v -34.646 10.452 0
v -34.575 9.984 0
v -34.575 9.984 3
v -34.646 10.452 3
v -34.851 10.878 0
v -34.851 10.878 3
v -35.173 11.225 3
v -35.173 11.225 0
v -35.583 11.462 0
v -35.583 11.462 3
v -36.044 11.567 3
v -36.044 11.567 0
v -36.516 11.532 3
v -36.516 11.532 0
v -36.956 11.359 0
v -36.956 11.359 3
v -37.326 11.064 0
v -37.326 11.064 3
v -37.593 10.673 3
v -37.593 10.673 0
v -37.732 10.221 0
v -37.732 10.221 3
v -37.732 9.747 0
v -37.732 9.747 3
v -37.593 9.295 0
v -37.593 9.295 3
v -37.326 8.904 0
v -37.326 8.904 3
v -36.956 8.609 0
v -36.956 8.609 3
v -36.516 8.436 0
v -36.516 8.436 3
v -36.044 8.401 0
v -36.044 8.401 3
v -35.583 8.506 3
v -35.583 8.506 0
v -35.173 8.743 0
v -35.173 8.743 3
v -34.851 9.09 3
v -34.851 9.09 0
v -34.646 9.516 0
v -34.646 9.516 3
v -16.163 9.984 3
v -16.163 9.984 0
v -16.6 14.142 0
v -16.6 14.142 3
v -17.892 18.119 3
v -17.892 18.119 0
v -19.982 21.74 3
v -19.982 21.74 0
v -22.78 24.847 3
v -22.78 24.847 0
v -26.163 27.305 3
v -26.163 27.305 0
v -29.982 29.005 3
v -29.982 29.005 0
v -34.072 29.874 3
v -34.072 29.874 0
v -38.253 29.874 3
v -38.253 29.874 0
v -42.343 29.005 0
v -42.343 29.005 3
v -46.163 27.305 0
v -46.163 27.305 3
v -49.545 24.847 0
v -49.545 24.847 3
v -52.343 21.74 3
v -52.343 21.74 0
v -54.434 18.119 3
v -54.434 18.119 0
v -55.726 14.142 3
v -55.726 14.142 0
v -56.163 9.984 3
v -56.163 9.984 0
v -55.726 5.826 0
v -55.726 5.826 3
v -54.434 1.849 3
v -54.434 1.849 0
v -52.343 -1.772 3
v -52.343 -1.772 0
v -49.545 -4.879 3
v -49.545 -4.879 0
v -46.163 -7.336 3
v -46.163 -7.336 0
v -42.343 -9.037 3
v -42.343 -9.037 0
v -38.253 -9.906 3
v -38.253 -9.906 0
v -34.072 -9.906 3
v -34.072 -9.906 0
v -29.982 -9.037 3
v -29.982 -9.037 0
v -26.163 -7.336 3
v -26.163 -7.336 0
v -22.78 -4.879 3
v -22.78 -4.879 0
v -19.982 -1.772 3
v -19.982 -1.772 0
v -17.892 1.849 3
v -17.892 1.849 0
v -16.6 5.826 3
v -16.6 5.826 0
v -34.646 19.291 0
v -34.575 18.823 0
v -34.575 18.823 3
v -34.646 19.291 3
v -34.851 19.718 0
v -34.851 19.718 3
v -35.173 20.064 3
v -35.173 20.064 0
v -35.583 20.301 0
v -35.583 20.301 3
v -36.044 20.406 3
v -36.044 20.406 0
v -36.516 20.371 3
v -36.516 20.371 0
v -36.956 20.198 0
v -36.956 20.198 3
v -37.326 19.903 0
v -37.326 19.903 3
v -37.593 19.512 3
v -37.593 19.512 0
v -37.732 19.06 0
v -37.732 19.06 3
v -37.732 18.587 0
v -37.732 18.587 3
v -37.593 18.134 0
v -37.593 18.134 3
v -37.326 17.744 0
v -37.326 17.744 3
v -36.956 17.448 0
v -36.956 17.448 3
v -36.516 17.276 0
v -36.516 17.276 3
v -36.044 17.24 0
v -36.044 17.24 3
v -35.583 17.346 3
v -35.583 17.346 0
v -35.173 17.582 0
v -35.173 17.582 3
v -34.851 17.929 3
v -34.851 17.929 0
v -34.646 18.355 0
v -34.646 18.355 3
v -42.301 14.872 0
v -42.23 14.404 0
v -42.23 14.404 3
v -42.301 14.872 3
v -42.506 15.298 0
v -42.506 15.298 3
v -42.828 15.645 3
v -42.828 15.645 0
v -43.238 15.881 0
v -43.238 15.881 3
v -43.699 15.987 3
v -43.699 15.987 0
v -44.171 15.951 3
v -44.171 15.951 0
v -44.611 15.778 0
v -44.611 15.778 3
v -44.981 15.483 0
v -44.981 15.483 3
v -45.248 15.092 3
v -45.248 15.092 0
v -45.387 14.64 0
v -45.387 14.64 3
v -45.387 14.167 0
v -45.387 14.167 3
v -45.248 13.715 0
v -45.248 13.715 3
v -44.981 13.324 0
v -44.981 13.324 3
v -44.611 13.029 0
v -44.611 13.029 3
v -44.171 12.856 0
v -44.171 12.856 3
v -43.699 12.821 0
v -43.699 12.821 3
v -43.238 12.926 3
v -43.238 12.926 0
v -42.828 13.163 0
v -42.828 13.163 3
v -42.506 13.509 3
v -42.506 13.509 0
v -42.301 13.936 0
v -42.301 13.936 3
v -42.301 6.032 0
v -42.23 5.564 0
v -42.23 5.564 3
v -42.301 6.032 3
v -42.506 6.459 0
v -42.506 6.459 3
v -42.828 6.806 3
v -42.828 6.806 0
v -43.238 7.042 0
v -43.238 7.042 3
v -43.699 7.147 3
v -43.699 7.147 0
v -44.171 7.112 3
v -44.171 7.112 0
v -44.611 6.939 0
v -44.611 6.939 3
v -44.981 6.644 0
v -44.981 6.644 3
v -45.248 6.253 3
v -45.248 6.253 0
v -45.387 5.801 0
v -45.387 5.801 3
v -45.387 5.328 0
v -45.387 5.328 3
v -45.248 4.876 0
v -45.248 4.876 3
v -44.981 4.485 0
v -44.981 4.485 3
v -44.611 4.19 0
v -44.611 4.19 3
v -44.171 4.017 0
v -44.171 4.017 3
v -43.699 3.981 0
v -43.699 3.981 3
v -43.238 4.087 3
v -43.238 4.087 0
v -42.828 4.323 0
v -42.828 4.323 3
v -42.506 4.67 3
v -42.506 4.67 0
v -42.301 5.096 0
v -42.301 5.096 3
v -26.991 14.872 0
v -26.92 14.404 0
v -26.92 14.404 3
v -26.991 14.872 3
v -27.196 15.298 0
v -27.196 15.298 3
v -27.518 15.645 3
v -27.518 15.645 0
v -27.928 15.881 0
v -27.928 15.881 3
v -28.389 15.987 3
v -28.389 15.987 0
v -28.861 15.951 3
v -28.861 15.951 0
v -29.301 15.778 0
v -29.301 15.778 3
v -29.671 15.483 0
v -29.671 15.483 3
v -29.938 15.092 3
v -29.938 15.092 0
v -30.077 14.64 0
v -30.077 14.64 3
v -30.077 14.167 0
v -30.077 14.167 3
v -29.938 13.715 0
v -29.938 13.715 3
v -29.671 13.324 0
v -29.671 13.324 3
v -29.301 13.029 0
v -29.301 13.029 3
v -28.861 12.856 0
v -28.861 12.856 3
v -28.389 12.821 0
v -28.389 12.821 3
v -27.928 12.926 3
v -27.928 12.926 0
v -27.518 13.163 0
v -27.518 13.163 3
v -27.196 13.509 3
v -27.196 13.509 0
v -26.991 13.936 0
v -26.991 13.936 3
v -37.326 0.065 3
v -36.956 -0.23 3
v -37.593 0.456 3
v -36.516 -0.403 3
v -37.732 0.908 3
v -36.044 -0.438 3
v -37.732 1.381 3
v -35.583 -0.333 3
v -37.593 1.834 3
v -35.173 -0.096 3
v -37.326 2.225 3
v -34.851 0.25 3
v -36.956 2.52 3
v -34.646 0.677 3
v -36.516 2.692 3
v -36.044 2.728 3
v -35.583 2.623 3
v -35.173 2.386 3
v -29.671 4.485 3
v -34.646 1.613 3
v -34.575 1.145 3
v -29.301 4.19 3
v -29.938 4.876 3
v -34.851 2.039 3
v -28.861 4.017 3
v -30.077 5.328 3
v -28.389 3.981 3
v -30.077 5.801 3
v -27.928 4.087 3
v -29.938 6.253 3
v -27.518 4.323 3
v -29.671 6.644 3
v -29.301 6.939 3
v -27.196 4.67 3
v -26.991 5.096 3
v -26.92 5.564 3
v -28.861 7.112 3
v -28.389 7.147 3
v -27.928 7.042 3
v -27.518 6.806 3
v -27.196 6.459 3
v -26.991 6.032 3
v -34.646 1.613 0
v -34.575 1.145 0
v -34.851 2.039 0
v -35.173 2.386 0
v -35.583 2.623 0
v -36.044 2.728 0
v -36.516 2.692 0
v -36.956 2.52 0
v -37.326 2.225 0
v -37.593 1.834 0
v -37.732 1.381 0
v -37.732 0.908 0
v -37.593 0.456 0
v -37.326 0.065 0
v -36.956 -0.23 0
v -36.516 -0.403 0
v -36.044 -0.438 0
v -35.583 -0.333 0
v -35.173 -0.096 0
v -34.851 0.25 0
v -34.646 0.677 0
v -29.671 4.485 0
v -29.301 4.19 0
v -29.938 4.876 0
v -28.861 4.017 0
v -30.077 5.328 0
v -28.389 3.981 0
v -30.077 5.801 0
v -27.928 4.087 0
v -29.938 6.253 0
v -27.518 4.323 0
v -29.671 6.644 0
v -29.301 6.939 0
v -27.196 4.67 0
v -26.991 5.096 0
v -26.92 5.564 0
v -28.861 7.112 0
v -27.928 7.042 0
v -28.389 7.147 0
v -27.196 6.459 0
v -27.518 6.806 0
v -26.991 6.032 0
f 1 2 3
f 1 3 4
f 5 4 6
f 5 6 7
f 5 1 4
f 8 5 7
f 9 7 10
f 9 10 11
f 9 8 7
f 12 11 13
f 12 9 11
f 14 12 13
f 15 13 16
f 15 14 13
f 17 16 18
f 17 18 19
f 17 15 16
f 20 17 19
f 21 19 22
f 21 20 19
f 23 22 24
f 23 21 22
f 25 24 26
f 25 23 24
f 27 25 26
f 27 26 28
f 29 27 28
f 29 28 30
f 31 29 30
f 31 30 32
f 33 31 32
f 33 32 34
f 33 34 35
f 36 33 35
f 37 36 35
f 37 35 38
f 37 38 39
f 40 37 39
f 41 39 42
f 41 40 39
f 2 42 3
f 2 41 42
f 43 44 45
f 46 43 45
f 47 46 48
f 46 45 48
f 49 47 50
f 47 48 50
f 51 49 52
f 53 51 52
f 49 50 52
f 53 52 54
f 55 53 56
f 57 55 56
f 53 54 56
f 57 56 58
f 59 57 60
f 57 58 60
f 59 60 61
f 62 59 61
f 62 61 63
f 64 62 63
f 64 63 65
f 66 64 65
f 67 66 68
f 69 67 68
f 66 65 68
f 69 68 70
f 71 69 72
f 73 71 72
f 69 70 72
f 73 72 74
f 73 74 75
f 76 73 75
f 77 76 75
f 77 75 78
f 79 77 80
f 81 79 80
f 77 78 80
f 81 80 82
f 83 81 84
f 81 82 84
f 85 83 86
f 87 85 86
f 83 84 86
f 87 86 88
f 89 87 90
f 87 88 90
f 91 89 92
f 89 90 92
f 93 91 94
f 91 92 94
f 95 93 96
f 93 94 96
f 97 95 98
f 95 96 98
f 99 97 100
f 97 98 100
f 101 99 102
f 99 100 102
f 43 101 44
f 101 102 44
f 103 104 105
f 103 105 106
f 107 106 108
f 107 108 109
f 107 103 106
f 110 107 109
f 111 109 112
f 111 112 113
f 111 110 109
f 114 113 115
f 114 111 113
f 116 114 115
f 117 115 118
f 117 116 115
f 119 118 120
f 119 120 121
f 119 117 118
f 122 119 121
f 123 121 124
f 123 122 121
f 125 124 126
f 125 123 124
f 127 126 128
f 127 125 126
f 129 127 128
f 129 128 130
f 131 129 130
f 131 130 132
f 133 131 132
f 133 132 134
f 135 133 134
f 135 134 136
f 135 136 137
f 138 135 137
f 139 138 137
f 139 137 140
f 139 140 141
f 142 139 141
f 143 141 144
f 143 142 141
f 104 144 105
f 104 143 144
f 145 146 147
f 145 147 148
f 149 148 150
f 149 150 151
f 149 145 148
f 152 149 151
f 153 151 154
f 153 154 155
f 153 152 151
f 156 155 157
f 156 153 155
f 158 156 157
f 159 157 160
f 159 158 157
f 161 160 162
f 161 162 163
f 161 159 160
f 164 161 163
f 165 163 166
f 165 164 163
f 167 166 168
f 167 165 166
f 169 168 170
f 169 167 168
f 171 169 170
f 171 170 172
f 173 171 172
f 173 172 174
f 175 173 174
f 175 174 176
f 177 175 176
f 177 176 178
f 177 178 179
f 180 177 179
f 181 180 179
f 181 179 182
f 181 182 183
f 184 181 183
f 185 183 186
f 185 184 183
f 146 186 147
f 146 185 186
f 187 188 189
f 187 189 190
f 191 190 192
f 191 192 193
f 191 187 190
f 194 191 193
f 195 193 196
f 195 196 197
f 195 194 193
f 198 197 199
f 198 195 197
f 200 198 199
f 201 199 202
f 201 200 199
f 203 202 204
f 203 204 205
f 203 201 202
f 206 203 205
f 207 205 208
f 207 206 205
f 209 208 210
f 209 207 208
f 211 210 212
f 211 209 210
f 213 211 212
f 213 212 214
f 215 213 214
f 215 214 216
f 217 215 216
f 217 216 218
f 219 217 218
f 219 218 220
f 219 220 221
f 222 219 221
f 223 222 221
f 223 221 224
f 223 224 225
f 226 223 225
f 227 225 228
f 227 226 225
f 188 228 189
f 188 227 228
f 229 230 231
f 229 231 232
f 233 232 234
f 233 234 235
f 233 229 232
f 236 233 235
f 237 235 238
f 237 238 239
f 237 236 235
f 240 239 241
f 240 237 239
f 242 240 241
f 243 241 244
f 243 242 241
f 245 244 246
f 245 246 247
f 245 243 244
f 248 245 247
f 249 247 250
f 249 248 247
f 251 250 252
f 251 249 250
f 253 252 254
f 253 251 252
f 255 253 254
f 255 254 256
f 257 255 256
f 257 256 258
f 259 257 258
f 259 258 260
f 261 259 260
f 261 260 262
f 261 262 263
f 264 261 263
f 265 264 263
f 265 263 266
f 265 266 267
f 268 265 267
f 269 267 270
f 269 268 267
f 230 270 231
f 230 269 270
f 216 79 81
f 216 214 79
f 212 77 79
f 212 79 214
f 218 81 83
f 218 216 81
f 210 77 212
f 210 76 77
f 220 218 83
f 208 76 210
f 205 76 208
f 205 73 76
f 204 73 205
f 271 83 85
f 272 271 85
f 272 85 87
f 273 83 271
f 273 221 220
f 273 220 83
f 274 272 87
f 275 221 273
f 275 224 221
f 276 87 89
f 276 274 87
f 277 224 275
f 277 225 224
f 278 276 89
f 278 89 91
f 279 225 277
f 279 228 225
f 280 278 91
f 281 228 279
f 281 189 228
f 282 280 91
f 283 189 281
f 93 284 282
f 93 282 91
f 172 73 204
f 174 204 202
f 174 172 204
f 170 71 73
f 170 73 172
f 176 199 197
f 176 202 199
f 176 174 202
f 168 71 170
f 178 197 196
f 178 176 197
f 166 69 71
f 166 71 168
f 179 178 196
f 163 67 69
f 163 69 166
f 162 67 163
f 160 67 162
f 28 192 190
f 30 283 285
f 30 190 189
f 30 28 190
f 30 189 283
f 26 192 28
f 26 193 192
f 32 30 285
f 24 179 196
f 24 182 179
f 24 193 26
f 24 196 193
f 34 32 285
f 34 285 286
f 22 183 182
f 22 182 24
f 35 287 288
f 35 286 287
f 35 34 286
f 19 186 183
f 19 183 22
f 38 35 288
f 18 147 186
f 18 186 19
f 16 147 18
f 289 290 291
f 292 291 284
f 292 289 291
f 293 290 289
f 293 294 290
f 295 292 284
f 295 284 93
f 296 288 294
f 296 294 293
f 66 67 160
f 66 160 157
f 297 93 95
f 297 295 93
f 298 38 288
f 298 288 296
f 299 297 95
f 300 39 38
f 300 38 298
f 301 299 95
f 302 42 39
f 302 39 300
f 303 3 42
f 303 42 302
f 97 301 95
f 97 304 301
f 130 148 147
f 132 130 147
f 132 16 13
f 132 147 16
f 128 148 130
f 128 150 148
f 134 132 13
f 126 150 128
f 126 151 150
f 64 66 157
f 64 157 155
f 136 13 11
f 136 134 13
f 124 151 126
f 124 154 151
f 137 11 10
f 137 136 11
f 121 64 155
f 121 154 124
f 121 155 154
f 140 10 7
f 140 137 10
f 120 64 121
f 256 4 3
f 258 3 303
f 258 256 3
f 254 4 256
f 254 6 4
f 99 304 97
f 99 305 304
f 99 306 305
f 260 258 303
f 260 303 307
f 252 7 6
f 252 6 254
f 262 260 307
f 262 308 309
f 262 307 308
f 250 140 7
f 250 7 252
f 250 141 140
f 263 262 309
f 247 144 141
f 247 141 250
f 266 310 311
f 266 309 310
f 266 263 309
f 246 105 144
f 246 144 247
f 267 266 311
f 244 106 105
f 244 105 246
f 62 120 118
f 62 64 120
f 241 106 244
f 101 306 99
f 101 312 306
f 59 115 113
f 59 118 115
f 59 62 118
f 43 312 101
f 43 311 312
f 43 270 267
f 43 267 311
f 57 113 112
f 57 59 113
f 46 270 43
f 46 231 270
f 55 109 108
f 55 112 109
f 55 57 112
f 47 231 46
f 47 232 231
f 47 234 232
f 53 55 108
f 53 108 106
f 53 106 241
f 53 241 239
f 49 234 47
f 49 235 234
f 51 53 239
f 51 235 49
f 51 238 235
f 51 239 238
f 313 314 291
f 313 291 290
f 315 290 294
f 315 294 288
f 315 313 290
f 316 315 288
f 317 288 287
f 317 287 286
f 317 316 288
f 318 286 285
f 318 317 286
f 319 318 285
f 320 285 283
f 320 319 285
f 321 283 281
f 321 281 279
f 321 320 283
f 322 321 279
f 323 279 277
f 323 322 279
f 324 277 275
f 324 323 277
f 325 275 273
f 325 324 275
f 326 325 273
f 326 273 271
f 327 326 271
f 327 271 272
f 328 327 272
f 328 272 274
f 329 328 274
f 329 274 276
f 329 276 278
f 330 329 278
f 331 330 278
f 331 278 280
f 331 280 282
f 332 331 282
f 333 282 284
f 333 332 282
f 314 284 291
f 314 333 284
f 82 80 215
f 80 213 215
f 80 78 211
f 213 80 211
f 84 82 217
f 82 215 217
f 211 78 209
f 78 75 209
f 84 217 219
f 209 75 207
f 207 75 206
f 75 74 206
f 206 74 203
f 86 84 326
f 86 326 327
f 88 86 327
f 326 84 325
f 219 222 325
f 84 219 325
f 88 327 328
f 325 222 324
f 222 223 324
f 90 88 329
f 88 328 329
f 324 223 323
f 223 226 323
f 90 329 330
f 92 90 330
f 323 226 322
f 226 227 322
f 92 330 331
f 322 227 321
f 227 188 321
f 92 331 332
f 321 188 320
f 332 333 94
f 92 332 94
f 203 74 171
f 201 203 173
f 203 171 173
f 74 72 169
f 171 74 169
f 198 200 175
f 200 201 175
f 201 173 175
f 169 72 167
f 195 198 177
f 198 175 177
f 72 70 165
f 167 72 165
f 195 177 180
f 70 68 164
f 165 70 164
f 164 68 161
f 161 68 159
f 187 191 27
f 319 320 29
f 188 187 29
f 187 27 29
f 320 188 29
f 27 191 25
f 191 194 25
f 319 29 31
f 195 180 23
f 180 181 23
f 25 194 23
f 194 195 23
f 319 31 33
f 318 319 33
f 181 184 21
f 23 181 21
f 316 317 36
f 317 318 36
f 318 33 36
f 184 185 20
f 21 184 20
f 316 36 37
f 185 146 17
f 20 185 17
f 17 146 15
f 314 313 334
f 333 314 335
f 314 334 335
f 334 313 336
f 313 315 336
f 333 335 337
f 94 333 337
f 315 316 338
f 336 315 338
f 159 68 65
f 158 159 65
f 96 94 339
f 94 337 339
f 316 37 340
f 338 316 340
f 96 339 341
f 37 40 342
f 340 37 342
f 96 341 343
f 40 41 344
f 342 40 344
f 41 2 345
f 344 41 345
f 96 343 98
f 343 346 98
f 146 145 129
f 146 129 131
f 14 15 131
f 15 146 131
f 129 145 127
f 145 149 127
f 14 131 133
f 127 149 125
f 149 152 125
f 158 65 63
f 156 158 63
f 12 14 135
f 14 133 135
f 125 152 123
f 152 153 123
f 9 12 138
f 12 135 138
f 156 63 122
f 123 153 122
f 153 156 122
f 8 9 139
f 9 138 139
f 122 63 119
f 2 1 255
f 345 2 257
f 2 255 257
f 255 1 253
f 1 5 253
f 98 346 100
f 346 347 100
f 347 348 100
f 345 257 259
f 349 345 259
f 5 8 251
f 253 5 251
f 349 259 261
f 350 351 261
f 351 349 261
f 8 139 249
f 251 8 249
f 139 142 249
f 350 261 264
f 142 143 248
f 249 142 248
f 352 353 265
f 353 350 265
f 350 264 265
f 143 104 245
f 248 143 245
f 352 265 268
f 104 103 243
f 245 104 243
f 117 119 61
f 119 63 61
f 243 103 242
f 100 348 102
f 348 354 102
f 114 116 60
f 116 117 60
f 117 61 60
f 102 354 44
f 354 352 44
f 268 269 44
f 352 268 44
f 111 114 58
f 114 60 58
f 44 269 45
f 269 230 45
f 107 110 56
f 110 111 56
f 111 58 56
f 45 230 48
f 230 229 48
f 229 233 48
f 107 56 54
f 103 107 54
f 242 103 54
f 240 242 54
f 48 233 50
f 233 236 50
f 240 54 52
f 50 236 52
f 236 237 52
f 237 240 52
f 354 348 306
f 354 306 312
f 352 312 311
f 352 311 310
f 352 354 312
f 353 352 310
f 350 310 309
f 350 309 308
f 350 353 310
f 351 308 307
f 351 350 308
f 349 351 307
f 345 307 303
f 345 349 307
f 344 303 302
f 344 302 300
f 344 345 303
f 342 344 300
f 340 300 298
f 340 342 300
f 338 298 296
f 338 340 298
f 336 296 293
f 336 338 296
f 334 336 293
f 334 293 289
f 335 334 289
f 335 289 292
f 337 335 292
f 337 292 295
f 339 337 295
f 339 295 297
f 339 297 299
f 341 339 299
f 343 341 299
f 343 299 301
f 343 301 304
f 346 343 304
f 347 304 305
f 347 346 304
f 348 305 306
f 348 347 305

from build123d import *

# Parameters (mm, degrees)
F0_R     = 20
F0_R_2   = 1.5875
F1_DEPTH = 3


with BuildPart() as f1:
    # F0 (on Top) → F1 (new body)
    with BuildSketch(Plane.XY):
        with Locations((-36.162619, 9.984028)):
            Circle(F0_R)
        with Locations((-43.817643, 5.564397)):
            Circle(F0_R_2, mode=Mode.SUBTRACT)
        with Locations((-36.162619, 1.144767)):
            Circle(F0_R_2, mode=Mode.SUBTRACT)
        with Locations((-28.507594, 5.564397)):
            Circle(F0_R_2, mode=Mode.SUBTRACT)
        with Locations((-43.817643, 14.403658)):
            Circle(F0_R_2, mode=Mode.SUBTRACT)
        with Locations((-36.162619, 9.984028)):
            Circle(F0_R_2, mode=Mode.SUBTRACT)
        with Locations((-28.507594, 14.403658)):
            Circle(F0_R_2, mode=Mode.SUBTRACT)
        with Locations((-36.162619, 18.823288)):
            Circle(F0_R_2, mode=Mode.SUBTRACT)
    extrude(amount=F1_DEPTH)


solid = f1.part
